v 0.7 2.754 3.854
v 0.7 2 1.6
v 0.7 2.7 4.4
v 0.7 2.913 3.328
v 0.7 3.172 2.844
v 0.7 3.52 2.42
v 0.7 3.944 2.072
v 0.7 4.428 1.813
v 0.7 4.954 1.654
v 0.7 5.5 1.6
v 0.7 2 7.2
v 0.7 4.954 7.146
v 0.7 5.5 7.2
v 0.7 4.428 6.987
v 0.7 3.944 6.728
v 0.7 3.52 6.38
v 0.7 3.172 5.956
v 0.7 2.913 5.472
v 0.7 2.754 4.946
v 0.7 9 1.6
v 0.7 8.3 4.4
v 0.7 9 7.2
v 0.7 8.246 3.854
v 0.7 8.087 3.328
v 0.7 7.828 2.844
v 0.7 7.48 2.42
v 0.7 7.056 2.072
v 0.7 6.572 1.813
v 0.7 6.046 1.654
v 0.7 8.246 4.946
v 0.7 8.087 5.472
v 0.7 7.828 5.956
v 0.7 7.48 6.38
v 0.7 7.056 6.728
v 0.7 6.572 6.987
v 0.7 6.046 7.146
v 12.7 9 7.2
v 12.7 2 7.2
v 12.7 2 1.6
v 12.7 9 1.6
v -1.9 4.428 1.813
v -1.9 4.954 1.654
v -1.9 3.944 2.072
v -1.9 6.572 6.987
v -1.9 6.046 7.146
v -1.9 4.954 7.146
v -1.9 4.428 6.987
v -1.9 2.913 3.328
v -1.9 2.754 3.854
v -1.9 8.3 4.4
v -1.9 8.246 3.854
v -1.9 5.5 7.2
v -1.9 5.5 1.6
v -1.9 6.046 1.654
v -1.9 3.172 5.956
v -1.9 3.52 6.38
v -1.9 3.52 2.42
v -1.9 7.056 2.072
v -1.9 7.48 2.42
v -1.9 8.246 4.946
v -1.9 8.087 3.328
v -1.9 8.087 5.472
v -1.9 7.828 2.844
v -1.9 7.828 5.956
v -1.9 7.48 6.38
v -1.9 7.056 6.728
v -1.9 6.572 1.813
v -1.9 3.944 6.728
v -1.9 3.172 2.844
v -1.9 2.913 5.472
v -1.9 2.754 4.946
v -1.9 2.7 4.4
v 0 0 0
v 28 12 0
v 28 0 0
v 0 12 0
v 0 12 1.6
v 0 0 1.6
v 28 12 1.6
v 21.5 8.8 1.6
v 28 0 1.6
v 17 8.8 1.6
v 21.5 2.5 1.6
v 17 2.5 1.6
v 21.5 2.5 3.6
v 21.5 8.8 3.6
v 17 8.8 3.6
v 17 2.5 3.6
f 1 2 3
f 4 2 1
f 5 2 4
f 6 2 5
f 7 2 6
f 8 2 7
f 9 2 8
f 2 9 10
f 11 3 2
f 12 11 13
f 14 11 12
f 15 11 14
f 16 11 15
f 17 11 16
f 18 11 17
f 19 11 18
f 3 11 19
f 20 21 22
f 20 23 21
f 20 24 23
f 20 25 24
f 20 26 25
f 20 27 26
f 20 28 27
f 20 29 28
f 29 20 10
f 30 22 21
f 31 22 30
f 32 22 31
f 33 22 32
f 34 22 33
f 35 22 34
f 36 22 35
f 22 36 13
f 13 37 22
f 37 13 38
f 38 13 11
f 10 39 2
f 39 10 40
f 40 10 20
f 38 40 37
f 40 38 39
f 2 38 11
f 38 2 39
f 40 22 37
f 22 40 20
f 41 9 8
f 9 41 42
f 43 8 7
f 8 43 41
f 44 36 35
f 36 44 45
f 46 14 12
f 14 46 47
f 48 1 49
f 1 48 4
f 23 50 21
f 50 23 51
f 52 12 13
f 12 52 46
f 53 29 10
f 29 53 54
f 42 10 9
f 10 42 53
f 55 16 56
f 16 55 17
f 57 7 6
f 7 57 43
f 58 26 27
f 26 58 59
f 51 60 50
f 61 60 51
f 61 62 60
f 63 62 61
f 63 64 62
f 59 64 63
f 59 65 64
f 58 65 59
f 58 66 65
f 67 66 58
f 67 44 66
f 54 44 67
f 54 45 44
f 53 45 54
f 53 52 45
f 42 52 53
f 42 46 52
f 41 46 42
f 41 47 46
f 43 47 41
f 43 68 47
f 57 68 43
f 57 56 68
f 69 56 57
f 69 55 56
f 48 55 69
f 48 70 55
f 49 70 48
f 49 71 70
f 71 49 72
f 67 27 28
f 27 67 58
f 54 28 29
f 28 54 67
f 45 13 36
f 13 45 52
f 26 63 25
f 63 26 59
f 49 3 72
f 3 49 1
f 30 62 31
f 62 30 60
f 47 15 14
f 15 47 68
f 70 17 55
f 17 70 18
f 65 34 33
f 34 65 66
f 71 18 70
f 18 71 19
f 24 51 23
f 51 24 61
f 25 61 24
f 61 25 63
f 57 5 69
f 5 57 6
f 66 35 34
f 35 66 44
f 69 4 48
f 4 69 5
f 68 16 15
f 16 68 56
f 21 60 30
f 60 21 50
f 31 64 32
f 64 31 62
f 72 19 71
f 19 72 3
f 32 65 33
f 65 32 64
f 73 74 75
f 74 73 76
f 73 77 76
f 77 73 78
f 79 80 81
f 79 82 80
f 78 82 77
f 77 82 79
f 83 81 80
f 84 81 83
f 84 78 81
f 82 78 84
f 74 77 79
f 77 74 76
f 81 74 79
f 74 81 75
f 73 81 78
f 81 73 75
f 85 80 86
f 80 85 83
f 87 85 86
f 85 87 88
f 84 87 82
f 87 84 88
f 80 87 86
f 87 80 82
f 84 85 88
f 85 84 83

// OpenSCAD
// file: connectors.scad
$incolor = (is_undef($incolor)) ? true : $incolor;


module pin_headers(cols, rows) {
    w = 2.54; h = 2.54; p = 0.65;
	pinc  = $incolor ? "gold"  : undef;
	basec = $incolor ? "black" : undef;
	
    for(x = [0 : (cols -1)]) {
        for(y = [0 : (rows  - 1)]) {
            translate([w * x, w * y, 0]) {
                union() {
                    color(basec) cube([w, w, h]);
                    color(pinc)  translate([(w - p) / 2, (w - p) / 2, -3]) cube([p, p, 11.54]);
                }
            }
        }
    }
}

module pin_right_angle_low(cols) {
    w = 2.54; p = 0.65;
	pinc  = $incolor ? "gold"  : undef;
	basec = $incolor ? "black" : undef;
    d = (w - p) / 2;
    for(x = [0 : (cols -1)]) {
        translate([w * x, 0, 0]) {
            color(basec) translate([0, d - 1, -2]) cube([w, w, w]);
            color(pinc)  translate([d, d, -4]) cube([p, p, 5 + w / 2]);
            color(pinc)  translate([d, d + 7 + w, d + 1]) rotate(a=90, v=[1, 0, 0]) cube([p, p, 5 + w + 2]);
        }
    }
}

module usb_connector(x, y, z) {
    f = 0.6; // Flange
	shieldc = $incolor ? "silver" : undef;
    color(shieldc) { 
		cube([x, y, z]);
		translate([-f, y - f, -f])
			cube([x + f * 2, f, z + f * 2]);
	}
}

module audio_jack() {
    x = 11.4; y = 12; z = 10.2;
    d = 6.7; h = 3.4;
    color("blue") cube([x, y, z]);
    translate([-h, y / 2, (d / 2) + 3])
        rotate(a=90, v=[0, 1, 0])
            color("blue") cylinder(r=(d / 2), h=h);
}

module hdmi_connector(x, y, z) {
	shieldc = $incolor ? "silver" : undef;
    color(shieldc) cube([x, y, z]);
}

module microusb_connector(x, y, z) {
	shieldc = $incolor ? "silver" : undef;
    color(shieldc) cube([x, y, z]);
}

module spi_connector() {
	basec = $incolor ? "beige" : undef;
	snapc = $incolor ? "black" : undef;
    color(basec) cube([20, 2.4, 3.5]);
    translate([-1, 0, 3.5])
        color(snapc) cube([22, 2.4, 1.4]);
}

module micro_sd_card() {
	shieldc = $incolor ? "silver" : undef;
	cardc = $incolor ? "black" : undef;
    color(shieldc) cube([12, 11.3, 1.5]);
    translate([0.5, -4,0.25])
    color(cardc) cube([11,4,1]);    
}

module audio_video(size_x) {
	avc = $incolor ? [58/255, 58/255, 58/255] : undef;
    color(avc) {
        cube([size_x, 7, 5.6]);
        translate([size_x, 7 / 2, 5.6 / 2]) rotate([0,90,0]) cylinder(d=5.6, h=2.6);
    }
}
// main file
include <connectors.scad>

interf = 0.1;
$incolor = (is_undef($incolor)) ? true : $incolor;
$alpha = (is_undef($alpha)) ? 1 : $alpha;

//------------------------------------------------------------------------
// m25_standard_hole Standard fit M2.5 hole size definition
//------------------------------------------------------------------------
module m25_standard_hole() {
	circle(r=(2.75 / 2), $fn=16);
}

//------------------------------------------------------------------------
// Move copies of children to positions in passed array
//------------------------------------------------------------------------
module array_holes(pos) {
	for (pos=pos) {			
		translate(pos) children();
	}
}

//------------------------------------------------------------------------
// Raspberry Pi Model A+ rev.1.1
//------------------------------------------------------------------------
module pi_3a(heatsink=true) {

    $fn = 32;
    x  = 56;     y = 65;    z = 1.60;  // Measured PCB size
    hx = 11.40; hy = 15.1; hz = 6.15;  // Measured HDMI connector size
    ux = 13.25; uy = 13.8; uz = 6.0;   // Measured USB connector size
    mx =  5.60; my =  7.6; mz = 2.40;  // Measured micro USB power connector size
    boardc = $incolor ? "green" : undef;
    heatc  = $incolor ? "black" : undef;
    cpuc   = $incolor ? "lightgrey" : undef;

    // The origin is the lower face of PCB.
    translate([0, 0, z]) {
        translate([1.0, 7.1, 0])                    pin_headers(2, 20);
        translate([x - hx + 1, 32.0 - (hy / 2), 0]) hdmi_connector(hx, hy, hz);
        translate([x - mx + 1, 10.6 - (my / 2), 0]) microusb_connector(mx, my, mz);
        translate([18, y - 12, 0.8])                usb_connector(ux, uy, uz);
        translate([20.5, 1.4, -z*2])                micro_sd_card();
        translate([17.5, 2.5, 0])                   spi_connector();
        translate([35.5, 44, 0])                    spi_connector();
        
        translate([x - 12.8, 50, 0])                audio_video(12.8);
        translate([x + 2.2, 10.55, 1.2])            rotate(a=270, v=[0, 0, 1]);
        translate([16, 19, 0]) {
            color(cpuc) cube([14.5, 14.5, 1.5]);
            if(heatsink)
                translate([0,0,1.5]) color(heatc) {
                    cube([14.5, 14.5, 1.5]);
                    translate([0,0,1.5]) 
                    for(x=[0: 4.1: 14.5], y=[0: 3.3: 14]) {
                        translate([x,y,0]) cube([2.2, 1.2, 6.5]);
                    }
                }
        }
        translate([0, 0, -z]) {
            color(boardc) linear_extrude(height=z)
                difference() {
                    hull() {
                        translate([  3,   3]) circle(r=3);
                        translate([x-3,   3]) circle(r=3);
                        translate([x-3, y-3]) circle(r=3);
                        translate([  3, y-3]) circle(r=3);
                    }
                    pi_3a_holes();
                }
        }
    }
}

module pi_3a_holes() {
 	off=3.5;
	x=49 + off;
	y=58 + off;
	holes=[
		[off,off], [x, off],
		[off, y],  [x, y]
	];
	
	if ($children > 0) {
		array_holes(pos=holes) children();
	} else {
		array_holes(pos=holes) m25_standard_hole();		
	}
}

module pi_3a_mounts(height=2, hole=2, thickness=2) {
    $fn = 32;
	mountc  = $incolor ? "grey"  : undef;
    pi_3a_holes() {
        color(mountc) linear_extrude(height) difference() {
            circle(r=hole/2 + thickness);
            circle(r=hole/2);
        }
    }
}


//------------------------------------------------------------------------
// 1602A LCD panel 16x2 characters.
//------------------------------------------------------------------------
module lcd_1602a() {
    $fn = 32;
	boardc  = $incolor ? "green"  : undef;
	metalc  = $incolor ? "black"  : undef;
	lcdc  = $incolor ? [64/255, 64/255, 128/255] : undef;

    translate([4.5, 5.5, 1.8])  
        difference() {
            color(metalc) cube([71, 24, 7]);
            translate([3.2, 4.8, 6.5])
                color(lcdc) cube([64.4, 14.4, 8]);
        }
    color(boardc) linear_extrude(height = 1.8) difference() {
        square(size=[80, 36]);
        lcd_1602a_holes() {
            circle(r=3/2);
        }
    }
    translate([33, 3, 4]) 
        rotate([180,0,0]) pin_headers(16,1);
}

module lcd_1602a_holes() {
    holes = [
        [3, 3], [80 - 3, 3],
        [80 - 3, 36 - 3], [3, 36 - 3]
    ];
	
	if ($children > 0) {
		array_holes(pos=holes) children();
	} else {
		array_holes(pos=holes) m25_standard_hole();		
	}
}

module lcd_1602a_mounts(height=2, hole=2.5, thickness=2) {
    $fn = 32;
	mountc  = $incolor ? "grey"  : undef;
    lcd_1602a_holes() {
        color(mountc) linear_extrude(height=height) difference() {
            circle(r=hole/2 + thickness);
            circle(r=hole/2);
        }
    }
}



//------------------------------------------------------------------------
// HW-040 Rotary Encoder
//------------------------------------------------------------------------

module encoder_hw_040() {
    $fn = 32;
	boardc  = $incolor ? "green"  : undef;
	metalc  = $incolor ? "grey"  : undef;
    color(boardc) linear_extrude(height = 1.4) difference() {
        square(size=[26, 18.5]);
        encoder_hw_040_holes() {
            circle(r=2.5/2);
        }
    }
    color(metalc) union() {
        translate([4.5, 4.5, 1.4]) cube([12, 12, 4.5]);
        translate([10.5, 10.5, 8.9]) cylinder(7, 3.5, 3.5, true);
        translate([10.5, 10.5, 12]) cylinder(7, 2, 2, true);
        translate([10.5, 10.5, 13]) difference() {
            cylinder(14, 3, 3);
            translate([-3, 1.5, 3.5]) cube([6, 5, 12]);
        }
    }
    translate([22.5, 17, 3.4]) rotate([0, 0, -90]) pin_right_angle_low(5);
}

module encoder_hw_040_holes() {
    holes = [
        [4.5, 1.7], [19.0, 1.7]
    ];
	
	if ($children > 0) {
		array_holes(pos=holes) children();
	} else {
		array_holes(pos=holes) m25_standard_hole();		
	}
}

module encoder_hw_040_mounts(height=2, hole=2, thickness=2) {
    $fn = 32;
	mountc  = $incolor ? "grey"  : undef;
    encoder_hw_040_holes() {
        color(mountc) linear_extrude(height) difference() {
            circle(r=hole/2 + thickness);
            circle(r=hole/2);
        }
    }
}



//------------------------------------------------------------------------
// HW-575 Dual Linear Pot
//------------------------------------------------------------------------

module fader_hw_575() {
    $fn = 32;
	boardc  = $incolor ? "lightblue"  : undef;
	metalc  = $incolor ? "silver"  : undef;
	feltc   = $incolor ? "black"  : undef;
    color(boardc) linear_extrude(height = 1.4) difference() {
        square(size=[38.8, 117.3]);
        fader_hw_575_holes() {
            circle(r=3.7/2);
        }
    }
    color(metalc) union() {
        translate([3, 20, 1.4]) 
            cube([12.3, 88, 12.3]);
        translate([23.5, 20, 1.4]) 
            cube([12.3, 88, 12.3]);
        translate([8.5, 25, 13.7]) 
            cube([1.4, 6, 10]);
        translate([29, 95, 13.7]) 
            cube([1.4, 6, 10]);
    }
    color(feltc) union() {
        translate([3.2, 20, 13.6]) 
            cube([11.8, 88, 0.2]);
        translate([23.7, 20, 13.6]) 
            cube([11.8, 88, 0.2]);        
    }
    translate([28.3, 14.5, 3.4]) 
       rotate([0,0,180]) {
          pin_right_angle_low(3);
          translate([10,0,0])
              pin_right_angle_low(3);
       }    
}


module fader_hw_575_holes() {
    w = 38.8;
    l = 117.3;
    x = 3.2;
    y = 3.7;
    holes = [
        [x, y], [w-x, y],
        [x, l-y], [w-x, l-y],
    ];
	
	if ($children > 0) {
		array_holes(pos=holes) children();
	} else {
		array_holes(pos=holes) m25_standard_hole();		
	}
}


module fader_hw_575_mounts(height=2, hole=2, thickness=2) {
    $fn = 32;
	mountc  = $incolor ? "grey"  : undef;
    fader_hw_575_holes() {
        color(mountc) linear_extrude(height) difference() {
            circle(r=hole/2 + thickness);
            circle(r=hole/2);
        }
    }
}

//------------------------------------------------------------------------
// CJMCU-5102 DAC
//------------------------------------------------------------------------


module cjmcu_5102() {
    $fn = 32;
	boardc  = $incolor ? "purple"  : undef;
	chipc   = $incolor ? "black"  : undef;
    color(boardc) linear_extrude(height = 1.6) 
        square(size=[23.6, 31.6]);
    translate([14.7,9,1.6])
        rotate([0,0,180])
            audio_video(12);
    color(chipc)
        translate([4.5, 23.2, 1.6]) 
            cube([6.5, 4.3, 1]);
    //translate([21, 28.4, 3.4]) 
    //   rotate([0,0,-90])
    //      pin_right_angle_low(10);
}

//------------------------------------------------------------------------
// Custom protoboard for MIDI In
//------------------------------------------------------------------------

module midi_in_protoboard() {
    $fn = 32;
	boardc  = $incolor ? "green"  : undef;
	chipc   = $incolor ? "beige"  : undef;
    color(boardc) linear_extrude(height = 1.6) 
        square(size=[28, 12]);
    translate([12.7,9,1.6])
        rotate([0,0,180])
            audio_video(12);
    color(chipc)
        translate([17, 2.5, 1.6]) 
            cube([4.5, 6.3, 2]);
}

midi_in_protoboard();
